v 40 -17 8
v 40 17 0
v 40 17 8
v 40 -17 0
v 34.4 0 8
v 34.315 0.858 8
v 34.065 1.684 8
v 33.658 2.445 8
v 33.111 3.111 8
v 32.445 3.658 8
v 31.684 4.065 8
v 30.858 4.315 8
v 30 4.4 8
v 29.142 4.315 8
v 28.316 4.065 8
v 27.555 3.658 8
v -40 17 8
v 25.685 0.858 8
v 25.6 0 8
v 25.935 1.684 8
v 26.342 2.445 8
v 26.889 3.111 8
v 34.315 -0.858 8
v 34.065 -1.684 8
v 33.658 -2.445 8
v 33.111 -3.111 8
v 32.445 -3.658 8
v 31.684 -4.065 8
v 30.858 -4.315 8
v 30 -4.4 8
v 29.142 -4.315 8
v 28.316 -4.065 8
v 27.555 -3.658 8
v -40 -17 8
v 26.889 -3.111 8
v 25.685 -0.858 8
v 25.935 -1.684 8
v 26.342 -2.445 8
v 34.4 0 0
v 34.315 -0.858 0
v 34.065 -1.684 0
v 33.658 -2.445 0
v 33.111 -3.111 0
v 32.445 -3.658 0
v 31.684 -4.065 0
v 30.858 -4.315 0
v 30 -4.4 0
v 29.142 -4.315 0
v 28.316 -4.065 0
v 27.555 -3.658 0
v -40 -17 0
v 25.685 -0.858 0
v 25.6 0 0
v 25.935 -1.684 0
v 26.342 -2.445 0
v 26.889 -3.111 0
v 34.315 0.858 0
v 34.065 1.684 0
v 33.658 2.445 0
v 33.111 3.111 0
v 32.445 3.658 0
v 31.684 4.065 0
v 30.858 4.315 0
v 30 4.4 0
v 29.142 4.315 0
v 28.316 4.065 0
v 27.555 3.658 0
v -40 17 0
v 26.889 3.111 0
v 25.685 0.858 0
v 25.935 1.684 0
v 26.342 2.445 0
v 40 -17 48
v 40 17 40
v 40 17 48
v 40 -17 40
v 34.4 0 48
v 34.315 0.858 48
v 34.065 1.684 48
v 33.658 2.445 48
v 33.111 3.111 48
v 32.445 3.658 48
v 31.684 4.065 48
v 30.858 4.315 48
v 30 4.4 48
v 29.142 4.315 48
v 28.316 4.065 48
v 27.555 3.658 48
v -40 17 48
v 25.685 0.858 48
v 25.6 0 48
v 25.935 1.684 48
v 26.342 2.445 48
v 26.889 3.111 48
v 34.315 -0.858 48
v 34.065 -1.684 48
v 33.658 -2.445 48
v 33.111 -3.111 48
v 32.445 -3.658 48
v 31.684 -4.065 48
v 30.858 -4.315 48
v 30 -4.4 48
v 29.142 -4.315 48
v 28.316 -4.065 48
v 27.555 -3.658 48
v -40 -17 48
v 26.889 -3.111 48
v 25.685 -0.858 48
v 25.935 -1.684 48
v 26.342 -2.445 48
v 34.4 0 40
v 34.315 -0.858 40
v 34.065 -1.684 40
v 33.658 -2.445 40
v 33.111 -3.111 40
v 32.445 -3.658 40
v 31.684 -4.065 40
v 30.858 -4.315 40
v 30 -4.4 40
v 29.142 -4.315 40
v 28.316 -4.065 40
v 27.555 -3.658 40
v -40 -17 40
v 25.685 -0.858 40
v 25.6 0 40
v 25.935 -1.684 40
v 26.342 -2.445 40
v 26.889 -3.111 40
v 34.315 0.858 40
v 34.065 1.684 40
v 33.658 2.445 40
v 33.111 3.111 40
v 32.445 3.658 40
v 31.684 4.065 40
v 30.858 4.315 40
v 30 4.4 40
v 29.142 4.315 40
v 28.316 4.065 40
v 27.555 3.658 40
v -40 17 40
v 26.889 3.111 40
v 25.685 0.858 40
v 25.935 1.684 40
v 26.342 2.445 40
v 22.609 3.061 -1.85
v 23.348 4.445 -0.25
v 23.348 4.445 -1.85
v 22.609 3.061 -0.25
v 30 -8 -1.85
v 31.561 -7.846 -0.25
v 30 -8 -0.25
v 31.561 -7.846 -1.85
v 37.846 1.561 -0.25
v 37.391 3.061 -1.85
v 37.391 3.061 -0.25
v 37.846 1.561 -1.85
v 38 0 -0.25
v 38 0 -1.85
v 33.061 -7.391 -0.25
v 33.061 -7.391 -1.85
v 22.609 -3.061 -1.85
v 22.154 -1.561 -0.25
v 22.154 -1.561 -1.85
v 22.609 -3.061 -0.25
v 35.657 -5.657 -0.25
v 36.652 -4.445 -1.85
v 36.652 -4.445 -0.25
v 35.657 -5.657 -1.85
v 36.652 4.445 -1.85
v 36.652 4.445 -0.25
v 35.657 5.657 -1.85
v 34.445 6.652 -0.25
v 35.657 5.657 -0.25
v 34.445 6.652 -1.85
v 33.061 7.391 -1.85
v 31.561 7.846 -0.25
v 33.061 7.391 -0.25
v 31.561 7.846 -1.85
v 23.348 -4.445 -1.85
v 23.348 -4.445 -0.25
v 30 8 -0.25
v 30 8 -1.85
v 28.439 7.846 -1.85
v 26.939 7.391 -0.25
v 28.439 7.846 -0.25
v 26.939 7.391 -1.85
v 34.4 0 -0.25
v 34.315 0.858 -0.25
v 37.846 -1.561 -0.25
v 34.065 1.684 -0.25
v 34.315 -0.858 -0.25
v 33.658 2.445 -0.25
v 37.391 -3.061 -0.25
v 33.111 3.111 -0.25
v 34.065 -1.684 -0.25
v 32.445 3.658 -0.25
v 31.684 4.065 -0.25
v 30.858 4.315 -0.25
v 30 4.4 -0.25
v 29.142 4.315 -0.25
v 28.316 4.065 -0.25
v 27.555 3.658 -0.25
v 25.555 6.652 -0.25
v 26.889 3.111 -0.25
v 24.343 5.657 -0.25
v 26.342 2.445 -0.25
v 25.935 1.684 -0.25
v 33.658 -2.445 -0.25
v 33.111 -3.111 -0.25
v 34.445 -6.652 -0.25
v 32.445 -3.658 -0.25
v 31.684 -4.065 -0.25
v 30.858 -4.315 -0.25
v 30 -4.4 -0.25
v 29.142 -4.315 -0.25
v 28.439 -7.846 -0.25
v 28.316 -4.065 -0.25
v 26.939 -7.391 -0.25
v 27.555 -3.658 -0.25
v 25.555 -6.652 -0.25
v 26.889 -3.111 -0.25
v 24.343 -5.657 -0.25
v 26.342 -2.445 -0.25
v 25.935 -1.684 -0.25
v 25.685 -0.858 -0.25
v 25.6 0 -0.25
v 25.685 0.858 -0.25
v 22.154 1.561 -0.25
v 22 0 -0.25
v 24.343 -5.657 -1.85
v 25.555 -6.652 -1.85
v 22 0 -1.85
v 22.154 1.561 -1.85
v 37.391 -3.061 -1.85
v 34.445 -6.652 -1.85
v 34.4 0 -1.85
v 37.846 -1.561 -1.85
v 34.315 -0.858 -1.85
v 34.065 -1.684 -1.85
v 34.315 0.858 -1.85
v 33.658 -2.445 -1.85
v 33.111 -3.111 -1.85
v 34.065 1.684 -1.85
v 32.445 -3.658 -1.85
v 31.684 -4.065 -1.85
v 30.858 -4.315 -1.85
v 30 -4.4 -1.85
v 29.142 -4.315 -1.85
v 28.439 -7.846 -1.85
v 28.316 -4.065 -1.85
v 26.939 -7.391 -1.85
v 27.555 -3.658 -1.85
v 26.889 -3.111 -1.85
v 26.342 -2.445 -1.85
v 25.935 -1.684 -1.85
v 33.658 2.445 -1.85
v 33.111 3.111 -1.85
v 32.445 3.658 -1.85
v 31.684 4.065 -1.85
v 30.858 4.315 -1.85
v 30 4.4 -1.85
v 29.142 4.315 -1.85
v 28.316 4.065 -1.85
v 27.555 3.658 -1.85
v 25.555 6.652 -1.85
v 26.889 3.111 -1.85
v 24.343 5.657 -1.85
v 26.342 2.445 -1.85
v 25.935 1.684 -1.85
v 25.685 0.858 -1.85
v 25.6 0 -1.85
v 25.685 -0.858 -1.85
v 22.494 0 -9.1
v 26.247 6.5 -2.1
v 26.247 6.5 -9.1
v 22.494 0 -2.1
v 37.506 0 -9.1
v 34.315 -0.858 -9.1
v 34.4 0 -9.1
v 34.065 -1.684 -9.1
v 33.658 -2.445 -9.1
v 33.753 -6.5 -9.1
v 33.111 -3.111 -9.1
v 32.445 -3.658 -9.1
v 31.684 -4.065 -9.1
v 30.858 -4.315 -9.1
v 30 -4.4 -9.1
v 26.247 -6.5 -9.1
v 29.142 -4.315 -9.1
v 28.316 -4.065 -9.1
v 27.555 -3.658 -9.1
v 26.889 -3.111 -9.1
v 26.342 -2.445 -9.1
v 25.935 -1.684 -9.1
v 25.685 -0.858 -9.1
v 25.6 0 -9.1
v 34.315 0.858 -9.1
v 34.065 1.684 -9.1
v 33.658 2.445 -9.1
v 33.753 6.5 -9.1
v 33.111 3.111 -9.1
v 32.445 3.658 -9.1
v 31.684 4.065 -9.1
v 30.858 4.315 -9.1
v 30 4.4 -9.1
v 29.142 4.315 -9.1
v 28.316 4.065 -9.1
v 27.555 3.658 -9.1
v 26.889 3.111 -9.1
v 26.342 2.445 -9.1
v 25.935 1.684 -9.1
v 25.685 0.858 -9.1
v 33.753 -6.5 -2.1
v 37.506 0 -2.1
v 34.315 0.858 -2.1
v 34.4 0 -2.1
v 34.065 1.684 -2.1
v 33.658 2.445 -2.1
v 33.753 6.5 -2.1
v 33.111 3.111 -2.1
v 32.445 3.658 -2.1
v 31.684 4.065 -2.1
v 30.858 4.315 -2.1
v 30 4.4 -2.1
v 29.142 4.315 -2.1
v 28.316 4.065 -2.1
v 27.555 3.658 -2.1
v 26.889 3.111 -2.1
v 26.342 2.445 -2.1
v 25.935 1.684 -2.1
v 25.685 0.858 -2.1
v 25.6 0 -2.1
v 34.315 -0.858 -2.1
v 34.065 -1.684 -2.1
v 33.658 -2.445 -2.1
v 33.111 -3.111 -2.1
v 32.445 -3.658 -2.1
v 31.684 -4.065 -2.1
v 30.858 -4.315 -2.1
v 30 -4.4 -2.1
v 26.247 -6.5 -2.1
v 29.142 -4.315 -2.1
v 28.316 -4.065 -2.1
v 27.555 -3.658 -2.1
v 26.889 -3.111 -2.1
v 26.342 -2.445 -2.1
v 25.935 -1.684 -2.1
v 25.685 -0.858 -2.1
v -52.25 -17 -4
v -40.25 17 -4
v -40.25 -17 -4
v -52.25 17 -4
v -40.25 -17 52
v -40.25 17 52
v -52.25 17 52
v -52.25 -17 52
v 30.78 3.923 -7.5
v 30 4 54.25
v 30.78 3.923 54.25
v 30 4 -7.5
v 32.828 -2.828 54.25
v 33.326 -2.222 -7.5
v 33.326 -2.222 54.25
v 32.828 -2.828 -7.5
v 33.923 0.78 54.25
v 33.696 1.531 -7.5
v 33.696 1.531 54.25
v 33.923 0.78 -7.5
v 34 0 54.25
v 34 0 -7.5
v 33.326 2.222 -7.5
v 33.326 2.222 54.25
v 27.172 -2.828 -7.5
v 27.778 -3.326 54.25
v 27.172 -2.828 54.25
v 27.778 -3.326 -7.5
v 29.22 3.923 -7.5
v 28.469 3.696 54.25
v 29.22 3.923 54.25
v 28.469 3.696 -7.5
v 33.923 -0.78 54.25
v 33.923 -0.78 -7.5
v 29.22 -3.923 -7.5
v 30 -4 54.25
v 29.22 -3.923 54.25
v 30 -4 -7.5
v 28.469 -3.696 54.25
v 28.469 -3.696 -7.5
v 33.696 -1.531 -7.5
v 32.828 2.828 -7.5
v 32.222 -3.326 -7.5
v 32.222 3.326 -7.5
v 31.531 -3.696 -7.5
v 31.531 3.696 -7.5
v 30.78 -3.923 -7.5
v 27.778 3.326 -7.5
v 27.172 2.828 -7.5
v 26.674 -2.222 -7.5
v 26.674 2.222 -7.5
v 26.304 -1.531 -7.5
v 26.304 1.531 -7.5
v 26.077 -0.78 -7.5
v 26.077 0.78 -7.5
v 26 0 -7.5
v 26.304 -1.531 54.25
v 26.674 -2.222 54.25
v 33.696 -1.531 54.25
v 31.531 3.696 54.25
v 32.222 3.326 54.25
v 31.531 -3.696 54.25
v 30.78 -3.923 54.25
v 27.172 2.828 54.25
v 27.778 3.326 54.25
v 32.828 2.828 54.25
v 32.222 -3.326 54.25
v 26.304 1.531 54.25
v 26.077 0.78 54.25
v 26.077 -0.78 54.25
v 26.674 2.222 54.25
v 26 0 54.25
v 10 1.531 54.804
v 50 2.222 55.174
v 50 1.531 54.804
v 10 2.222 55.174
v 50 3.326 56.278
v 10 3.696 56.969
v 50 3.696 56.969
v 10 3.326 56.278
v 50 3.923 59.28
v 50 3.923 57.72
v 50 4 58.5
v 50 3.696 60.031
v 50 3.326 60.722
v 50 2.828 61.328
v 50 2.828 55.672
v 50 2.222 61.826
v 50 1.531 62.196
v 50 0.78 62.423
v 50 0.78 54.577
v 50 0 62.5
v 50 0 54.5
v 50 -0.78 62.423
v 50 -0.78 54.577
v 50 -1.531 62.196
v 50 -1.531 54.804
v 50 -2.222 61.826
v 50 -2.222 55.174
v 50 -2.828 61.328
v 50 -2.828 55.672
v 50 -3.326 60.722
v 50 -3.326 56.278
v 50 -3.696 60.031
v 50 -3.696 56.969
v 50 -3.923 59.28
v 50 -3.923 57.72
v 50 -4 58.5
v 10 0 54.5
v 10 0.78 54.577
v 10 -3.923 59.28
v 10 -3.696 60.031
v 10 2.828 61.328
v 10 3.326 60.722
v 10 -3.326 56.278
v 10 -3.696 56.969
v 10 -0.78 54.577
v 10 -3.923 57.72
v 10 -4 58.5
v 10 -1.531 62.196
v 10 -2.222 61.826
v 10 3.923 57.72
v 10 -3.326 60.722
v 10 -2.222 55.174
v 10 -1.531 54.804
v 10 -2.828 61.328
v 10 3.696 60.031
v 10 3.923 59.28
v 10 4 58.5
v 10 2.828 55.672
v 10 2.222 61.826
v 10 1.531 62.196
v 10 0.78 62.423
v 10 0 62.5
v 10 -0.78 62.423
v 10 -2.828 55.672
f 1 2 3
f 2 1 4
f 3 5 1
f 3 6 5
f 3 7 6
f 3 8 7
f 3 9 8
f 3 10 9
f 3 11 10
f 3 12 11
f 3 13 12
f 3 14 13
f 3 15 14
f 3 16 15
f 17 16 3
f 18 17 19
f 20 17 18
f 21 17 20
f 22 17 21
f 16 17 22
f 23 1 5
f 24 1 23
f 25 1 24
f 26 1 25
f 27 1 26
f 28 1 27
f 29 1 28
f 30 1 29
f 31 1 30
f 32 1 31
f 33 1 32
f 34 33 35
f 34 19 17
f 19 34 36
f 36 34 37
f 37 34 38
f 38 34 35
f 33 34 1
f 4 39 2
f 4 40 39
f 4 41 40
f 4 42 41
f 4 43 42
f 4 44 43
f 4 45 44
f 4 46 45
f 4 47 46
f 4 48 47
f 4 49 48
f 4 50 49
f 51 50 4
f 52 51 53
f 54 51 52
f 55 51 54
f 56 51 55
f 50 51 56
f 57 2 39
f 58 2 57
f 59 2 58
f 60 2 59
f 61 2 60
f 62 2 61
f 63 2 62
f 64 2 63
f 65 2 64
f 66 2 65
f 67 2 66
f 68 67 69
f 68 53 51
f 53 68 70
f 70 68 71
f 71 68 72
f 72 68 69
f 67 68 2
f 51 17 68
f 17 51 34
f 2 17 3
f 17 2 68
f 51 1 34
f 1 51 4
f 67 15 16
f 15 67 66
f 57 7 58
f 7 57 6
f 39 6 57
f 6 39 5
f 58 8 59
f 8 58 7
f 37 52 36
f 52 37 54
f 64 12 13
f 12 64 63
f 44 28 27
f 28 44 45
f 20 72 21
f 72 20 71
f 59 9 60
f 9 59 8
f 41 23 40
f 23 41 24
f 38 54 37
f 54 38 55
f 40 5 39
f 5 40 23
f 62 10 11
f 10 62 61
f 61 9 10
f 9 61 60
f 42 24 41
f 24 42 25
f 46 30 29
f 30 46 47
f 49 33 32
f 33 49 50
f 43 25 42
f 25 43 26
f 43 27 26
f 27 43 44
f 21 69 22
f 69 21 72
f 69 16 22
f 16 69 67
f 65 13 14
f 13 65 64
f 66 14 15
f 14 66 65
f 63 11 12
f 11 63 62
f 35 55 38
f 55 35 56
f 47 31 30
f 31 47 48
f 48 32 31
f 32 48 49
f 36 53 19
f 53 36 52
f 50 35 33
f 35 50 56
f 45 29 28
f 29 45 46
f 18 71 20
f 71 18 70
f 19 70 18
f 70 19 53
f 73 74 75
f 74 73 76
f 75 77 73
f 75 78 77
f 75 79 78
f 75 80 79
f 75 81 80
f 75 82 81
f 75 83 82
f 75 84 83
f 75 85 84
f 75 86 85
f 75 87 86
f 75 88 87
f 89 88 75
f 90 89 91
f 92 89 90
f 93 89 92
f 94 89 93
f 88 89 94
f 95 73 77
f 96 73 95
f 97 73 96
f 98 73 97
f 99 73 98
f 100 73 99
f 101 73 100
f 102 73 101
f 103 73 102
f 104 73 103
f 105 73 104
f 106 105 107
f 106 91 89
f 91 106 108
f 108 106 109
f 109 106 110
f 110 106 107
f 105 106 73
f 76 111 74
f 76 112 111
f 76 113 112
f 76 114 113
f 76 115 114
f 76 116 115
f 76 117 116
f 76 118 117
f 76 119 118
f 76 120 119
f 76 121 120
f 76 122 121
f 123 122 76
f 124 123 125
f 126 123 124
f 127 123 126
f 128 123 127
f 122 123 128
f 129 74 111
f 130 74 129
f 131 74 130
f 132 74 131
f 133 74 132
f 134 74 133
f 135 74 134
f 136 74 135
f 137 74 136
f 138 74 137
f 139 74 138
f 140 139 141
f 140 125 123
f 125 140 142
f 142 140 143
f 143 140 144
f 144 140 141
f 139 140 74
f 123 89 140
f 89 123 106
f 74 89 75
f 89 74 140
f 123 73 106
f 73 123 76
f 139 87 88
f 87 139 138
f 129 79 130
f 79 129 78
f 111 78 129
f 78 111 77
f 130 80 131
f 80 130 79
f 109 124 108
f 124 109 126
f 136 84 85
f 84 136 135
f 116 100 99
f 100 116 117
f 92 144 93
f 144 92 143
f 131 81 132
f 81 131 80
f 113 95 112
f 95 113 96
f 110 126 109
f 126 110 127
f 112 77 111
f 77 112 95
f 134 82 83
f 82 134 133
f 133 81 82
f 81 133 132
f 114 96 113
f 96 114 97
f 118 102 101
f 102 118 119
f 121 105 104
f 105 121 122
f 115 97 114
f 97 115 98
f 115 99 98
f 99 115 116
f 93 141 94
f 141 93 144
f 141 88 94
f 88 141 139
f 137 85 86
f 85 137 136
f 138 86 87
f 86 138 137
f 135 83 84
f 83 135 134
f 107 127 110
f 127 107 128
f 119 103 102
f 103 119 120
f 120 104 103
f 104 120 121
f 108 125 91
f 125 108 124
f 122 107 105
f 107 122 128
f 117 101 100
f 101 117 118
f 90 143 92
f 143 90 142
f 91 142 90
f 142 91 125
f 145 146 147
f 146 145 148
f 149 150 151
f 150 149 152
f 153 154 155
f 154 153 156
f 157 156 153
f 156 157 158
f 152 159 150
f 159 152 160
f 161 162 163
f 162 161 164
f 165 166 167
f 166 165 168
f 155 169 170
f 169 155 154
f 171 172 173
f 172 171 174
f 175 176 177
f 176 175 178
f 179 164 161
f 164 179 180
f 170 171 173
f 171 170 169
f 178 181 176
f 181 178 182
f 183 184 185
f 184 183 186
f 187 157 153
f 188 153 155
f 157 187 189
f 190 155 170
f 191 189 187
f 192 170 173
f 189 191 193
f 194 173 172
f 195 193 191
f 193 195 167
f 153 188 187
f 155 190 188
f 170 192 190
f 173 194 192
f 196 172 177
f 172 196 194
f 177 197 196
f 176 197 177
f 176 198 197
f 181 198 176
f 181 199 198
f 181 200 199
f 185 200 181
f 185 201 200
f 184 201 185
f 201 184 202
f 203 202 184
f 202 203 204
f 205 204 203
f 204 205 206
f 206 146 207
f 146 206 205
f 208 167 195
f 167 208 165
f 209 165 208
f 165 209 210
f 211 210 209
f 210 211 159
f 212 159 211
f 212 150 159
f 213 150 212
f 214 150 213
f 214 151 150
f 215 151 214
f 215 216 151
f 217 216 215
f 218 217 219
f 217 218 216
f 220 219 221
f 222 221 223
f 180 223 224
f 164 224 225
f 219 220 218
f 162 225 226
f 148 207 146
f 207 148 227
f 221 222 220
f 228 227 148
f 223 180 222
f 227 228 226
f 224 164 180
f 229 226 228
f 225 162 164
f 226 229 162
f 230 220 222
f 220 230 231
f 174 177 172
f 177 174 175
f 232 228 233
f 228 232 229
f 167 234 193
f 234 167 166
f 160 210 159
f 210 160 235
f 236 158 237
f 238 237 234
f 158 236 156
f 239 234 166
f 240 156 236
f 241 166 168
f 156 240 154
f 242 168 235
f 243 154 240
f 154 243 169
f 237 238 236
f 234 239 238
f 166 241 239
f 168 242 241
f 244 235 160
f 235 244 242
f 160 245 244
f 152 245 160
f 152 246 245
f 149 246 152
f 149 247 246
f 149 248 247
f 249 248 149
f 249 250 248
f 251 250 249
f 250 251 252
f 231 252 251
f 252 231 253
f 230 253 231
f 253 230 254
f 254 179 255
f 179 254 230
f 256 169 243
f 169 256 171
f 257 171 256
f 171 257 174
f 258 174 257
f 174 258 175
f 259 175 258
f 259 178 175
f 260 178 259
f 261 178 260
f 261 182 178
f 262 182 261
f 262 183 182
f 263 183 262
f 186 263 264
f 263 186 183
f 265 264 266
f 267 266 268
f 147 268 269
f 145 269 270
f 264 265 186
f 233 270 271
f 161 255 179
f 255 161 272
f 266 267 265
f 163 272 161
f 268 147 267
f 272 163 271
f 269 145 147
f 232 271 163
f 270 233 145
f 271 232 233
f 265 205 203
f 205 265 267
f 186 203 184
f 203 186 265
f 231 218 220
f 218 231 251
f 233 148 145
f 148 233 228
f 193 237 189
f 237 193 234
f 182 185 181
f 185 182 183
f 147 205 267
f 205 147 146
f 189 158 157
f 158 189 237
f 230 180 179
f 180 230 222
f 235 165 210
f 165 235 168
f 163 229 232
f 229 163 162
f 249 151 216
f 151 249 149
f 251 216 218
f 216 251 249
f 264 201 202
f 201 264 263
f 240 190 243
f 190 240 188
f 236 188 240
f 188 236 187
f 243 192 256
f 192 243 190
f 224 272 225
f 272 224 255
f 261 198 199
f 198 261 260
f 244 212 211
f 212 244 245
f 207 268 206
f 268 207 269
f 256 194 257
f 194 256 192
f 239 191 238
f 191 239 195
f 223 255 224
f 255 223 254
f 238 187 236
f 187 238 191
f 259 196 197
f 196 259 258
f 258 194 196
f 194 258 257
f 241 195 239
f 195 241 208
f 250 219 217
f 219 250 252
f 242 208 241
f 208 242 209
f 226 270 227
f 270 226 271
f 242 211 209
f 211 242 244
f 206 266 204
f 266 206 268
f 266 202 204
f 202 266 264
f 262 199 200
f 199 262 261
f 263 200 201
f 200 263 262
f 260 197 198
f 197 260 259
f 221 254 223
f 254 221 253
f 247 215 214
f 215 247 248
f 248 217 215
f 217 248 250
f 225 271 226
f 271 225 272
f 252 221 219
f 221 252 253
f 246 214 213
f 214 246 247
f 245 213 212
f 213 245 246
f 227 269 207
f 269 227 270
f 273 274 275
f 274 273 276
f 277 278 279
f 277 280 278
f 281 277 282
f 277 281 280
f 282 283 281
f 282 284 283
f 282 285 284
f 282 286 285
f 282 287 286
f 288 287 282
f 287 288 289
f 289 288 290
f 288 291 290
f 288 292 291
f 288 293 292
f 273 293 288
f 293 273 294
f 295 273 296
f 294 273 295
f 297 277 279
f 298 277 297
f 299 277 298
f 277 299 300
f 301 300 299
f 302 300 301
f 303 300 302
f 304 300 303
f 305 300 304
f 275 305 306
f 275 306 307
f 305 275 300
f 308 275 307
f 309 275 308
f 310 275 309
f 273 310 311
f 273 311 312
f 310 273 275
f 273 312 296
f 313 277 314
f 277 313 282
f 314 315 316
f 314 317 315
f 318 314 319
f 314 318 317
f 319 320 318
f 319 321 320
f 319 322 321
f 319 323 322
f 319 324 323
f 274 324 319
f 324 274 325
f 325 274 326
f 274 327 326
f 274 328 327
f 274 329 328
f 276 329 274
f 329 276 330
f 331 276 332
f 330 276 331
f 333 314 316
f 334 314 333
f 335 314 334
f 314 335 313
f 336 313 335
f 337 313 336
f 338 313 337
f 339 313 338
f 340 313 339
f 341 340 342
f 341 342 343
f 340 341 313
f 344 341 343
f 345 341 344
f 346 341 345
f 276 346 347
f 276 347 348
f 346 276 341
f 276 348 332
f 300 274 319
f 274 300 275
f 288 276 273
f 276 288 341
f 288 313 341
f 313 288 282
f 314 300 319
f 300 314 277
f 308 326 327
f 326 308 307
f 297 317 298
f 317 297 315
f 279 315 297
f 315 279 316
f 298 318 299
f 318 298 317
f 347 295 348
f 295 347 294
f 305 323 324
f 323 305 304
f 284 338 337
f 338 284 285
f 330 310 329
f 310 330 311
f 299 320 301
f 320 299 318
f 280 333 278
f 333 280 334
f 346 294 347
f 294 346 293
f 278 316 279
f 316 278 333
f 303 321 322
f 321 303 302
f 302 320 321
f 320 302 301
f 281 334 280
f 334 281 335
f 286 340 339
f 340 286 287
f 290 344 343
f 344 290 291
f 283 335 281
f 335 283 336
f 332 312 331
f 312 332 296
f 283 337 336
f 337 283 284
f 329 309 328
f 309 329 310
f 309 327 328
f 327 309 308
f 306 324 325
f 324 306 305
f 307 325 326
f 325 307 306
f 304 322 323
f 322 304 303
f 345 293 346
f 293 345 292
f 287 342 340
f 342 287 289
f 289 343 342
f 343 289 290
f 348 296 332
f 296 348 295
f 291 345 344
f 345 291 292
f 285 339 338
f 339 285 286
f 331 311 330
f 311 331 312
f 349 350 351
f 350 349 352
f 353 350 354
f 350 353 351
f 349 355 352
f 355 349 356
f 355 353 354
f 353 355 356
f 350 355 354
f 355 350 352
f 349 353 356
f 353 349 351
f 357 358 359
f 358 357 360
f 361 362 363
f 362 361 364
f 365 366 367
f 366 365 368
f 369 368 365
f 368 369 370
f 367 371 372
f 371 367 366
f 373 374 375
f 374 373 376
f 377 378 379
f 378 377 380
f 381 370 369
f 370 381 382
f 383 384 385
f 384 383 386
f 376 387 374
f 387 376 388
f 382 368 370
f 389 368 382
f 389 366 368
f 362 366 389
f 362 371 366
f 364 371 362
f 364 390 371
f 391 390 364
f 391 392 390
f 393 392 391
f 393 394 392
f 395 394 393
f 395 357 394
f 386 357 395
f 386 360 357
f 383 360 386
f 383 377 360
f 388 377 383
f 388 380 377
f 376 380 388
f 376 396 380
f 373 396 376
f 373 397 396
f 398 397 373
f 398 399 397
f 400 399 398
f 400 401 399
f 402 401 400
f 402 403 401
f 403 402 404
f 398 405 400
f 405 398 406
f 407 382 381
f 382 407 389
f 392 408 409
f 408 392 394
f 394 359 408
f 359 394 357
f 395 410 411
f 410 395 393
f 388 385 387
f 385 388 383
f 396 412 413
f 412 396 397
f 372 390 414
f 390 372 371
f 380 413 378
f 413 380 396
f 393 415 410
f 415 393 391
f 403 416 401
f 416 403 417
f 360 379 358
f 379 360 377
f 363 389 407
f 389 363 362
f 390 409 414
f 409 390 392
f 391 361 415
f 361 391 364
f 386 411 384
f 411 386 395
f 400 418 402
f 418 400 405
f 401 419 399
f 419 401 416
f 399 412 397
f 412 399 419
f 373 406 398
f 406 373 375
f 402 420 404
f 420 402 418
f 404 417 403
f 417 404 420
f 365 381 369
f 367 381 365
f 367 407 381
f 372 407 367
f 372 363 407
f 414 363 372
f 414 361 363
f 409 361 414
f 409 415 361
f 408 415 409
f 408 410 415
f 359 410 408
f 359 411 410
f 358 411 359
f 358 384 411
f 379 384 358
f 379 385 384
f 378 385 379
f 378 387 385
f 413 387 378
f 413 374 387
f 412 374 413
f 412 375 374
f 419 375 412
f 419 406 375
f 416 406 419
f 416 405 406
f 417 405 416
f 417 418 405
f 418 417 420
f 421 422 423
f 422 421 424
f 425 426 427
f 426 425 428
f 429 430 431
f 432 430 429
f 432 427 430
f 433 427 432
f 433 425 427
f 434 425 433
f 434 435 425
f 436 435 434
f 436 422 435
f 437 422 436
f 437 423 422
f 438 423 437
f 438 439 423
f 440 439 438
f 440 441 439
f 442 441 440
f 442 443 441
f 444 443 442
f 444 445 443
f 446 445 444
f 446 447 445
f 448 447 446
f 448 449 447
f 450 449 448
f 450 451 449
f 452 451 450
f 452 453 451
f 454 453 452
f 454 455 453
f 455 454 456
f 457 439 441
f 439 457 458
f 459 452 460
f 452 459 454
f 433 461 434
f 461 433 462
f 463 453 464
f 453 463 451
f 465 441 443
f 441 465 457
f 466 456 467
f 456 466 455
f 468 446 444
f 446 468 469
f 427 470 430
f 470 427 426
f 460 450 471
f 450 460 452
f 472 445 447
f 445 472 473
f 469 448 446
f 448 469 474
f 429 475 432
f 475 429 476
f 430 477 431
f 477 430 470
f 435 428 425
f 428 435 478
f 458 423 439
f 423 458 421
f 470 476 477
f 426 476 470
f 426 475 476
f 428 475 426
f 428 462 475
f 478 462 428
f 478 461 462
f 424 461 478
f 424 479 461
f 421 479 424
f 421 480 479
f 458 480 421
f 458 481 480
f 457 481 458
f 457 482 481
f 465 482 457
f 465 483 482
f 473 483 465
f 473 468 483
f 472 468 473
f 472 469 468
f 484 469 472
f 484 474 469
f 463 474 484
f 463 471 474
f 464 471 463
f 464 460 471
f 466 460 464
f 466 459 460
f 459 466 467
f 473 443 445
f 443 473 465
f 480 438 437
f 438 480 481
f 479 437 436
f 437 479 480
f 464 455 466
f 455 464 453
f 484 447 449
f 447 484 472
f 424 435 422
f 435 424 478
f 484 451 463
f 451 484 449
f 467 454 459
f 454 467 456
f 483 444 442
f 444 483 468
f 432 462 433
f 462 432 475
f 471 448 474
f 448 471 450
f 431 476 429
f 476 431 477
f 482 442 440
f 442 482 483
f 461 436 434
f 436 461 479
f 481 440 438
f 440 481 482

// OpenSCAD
$fn = 32;

// ------------------------------------------------------------------------
// C clamp: throat 40 mm, screw d8
// Every part is its own module, assembly() places every instance.
// ------------------------------------------------------------------------

// --- part 1 ---
module clamp_arm() {
  difference() {
    translate([-40, -17, 0]) cube([80, 34, 8]);
    translate([30, 0, -1]) cylinder(h = 10, d = 8.8);
  }
}

// --- part 2 ---
module clamp_spine() {
  difference() {
    translate([-28, -17, 0]) cube([56, 34, 12]);
  }
}

// --- part 3 ---
module clamp_screw() {
  translate([0, 0, -30.875]) cylinder(h = 61.75, d = 8);
}

// --- part 4 ---
module clamp_washer() {
  difference() {
      translate([0, 0, 0]) cylinder(h = 1.6, d = 16);
      translate([0, 0, -1]) cylinder(h = 3.6, d = 8.8);
    }
}

// --- part 5 ---
module clamp_nut() {
  difference() {
    linear_extrude(height = 7) polygon(points = [[7.506, 0], [3.753, 6.5], [-3.753, 6.5], [-7.506, 0], [-3.753, -6.5], [3.753, -6.5]]);
    translate([0, 0, -1]) cylinder(h = 9, d = 8.8);
  }
}

// --- part 6 ---
module tommy_bar() {
  translate([0, 0, -20]) cylinder(h = 40, d = 8);
}

// --- assembly ---
module assembly() {
  color([0.80, 0.24, 0.20]) translate([0, 0, 0]) rotate([0, 0, 0]) clamp_arm();
  color([0.20, 0.45, 0.75]) translate([0, 0, 40]) rotate([0, 0, 0]) clamp_arm();
  color([0.25, 0.62, 0.32]) translate([-52.25, 0, 24]) rotate([0, 90, 0]) clamp_spine();
  color([0.92, 0.70, 0.18]) translate([30, 0, 23.375]) rotate([0, 0, 0]) clamp_screw();
  color([0.58, 0.35, 0.70]) translate([30, 0, -1.85]) rotate([0, 0, 0]) clamp_washer();
  color([0.16, 0.66, 0.66]) translate([30, 0, -9.1]) rotate([0, 0, 0]) clamp_nut();
  color([0.85, 0.48, 0.18]) translate([30, 0, 58.5]) rotate([0, 90, 0]) tommy_bar();
}

assembly();
